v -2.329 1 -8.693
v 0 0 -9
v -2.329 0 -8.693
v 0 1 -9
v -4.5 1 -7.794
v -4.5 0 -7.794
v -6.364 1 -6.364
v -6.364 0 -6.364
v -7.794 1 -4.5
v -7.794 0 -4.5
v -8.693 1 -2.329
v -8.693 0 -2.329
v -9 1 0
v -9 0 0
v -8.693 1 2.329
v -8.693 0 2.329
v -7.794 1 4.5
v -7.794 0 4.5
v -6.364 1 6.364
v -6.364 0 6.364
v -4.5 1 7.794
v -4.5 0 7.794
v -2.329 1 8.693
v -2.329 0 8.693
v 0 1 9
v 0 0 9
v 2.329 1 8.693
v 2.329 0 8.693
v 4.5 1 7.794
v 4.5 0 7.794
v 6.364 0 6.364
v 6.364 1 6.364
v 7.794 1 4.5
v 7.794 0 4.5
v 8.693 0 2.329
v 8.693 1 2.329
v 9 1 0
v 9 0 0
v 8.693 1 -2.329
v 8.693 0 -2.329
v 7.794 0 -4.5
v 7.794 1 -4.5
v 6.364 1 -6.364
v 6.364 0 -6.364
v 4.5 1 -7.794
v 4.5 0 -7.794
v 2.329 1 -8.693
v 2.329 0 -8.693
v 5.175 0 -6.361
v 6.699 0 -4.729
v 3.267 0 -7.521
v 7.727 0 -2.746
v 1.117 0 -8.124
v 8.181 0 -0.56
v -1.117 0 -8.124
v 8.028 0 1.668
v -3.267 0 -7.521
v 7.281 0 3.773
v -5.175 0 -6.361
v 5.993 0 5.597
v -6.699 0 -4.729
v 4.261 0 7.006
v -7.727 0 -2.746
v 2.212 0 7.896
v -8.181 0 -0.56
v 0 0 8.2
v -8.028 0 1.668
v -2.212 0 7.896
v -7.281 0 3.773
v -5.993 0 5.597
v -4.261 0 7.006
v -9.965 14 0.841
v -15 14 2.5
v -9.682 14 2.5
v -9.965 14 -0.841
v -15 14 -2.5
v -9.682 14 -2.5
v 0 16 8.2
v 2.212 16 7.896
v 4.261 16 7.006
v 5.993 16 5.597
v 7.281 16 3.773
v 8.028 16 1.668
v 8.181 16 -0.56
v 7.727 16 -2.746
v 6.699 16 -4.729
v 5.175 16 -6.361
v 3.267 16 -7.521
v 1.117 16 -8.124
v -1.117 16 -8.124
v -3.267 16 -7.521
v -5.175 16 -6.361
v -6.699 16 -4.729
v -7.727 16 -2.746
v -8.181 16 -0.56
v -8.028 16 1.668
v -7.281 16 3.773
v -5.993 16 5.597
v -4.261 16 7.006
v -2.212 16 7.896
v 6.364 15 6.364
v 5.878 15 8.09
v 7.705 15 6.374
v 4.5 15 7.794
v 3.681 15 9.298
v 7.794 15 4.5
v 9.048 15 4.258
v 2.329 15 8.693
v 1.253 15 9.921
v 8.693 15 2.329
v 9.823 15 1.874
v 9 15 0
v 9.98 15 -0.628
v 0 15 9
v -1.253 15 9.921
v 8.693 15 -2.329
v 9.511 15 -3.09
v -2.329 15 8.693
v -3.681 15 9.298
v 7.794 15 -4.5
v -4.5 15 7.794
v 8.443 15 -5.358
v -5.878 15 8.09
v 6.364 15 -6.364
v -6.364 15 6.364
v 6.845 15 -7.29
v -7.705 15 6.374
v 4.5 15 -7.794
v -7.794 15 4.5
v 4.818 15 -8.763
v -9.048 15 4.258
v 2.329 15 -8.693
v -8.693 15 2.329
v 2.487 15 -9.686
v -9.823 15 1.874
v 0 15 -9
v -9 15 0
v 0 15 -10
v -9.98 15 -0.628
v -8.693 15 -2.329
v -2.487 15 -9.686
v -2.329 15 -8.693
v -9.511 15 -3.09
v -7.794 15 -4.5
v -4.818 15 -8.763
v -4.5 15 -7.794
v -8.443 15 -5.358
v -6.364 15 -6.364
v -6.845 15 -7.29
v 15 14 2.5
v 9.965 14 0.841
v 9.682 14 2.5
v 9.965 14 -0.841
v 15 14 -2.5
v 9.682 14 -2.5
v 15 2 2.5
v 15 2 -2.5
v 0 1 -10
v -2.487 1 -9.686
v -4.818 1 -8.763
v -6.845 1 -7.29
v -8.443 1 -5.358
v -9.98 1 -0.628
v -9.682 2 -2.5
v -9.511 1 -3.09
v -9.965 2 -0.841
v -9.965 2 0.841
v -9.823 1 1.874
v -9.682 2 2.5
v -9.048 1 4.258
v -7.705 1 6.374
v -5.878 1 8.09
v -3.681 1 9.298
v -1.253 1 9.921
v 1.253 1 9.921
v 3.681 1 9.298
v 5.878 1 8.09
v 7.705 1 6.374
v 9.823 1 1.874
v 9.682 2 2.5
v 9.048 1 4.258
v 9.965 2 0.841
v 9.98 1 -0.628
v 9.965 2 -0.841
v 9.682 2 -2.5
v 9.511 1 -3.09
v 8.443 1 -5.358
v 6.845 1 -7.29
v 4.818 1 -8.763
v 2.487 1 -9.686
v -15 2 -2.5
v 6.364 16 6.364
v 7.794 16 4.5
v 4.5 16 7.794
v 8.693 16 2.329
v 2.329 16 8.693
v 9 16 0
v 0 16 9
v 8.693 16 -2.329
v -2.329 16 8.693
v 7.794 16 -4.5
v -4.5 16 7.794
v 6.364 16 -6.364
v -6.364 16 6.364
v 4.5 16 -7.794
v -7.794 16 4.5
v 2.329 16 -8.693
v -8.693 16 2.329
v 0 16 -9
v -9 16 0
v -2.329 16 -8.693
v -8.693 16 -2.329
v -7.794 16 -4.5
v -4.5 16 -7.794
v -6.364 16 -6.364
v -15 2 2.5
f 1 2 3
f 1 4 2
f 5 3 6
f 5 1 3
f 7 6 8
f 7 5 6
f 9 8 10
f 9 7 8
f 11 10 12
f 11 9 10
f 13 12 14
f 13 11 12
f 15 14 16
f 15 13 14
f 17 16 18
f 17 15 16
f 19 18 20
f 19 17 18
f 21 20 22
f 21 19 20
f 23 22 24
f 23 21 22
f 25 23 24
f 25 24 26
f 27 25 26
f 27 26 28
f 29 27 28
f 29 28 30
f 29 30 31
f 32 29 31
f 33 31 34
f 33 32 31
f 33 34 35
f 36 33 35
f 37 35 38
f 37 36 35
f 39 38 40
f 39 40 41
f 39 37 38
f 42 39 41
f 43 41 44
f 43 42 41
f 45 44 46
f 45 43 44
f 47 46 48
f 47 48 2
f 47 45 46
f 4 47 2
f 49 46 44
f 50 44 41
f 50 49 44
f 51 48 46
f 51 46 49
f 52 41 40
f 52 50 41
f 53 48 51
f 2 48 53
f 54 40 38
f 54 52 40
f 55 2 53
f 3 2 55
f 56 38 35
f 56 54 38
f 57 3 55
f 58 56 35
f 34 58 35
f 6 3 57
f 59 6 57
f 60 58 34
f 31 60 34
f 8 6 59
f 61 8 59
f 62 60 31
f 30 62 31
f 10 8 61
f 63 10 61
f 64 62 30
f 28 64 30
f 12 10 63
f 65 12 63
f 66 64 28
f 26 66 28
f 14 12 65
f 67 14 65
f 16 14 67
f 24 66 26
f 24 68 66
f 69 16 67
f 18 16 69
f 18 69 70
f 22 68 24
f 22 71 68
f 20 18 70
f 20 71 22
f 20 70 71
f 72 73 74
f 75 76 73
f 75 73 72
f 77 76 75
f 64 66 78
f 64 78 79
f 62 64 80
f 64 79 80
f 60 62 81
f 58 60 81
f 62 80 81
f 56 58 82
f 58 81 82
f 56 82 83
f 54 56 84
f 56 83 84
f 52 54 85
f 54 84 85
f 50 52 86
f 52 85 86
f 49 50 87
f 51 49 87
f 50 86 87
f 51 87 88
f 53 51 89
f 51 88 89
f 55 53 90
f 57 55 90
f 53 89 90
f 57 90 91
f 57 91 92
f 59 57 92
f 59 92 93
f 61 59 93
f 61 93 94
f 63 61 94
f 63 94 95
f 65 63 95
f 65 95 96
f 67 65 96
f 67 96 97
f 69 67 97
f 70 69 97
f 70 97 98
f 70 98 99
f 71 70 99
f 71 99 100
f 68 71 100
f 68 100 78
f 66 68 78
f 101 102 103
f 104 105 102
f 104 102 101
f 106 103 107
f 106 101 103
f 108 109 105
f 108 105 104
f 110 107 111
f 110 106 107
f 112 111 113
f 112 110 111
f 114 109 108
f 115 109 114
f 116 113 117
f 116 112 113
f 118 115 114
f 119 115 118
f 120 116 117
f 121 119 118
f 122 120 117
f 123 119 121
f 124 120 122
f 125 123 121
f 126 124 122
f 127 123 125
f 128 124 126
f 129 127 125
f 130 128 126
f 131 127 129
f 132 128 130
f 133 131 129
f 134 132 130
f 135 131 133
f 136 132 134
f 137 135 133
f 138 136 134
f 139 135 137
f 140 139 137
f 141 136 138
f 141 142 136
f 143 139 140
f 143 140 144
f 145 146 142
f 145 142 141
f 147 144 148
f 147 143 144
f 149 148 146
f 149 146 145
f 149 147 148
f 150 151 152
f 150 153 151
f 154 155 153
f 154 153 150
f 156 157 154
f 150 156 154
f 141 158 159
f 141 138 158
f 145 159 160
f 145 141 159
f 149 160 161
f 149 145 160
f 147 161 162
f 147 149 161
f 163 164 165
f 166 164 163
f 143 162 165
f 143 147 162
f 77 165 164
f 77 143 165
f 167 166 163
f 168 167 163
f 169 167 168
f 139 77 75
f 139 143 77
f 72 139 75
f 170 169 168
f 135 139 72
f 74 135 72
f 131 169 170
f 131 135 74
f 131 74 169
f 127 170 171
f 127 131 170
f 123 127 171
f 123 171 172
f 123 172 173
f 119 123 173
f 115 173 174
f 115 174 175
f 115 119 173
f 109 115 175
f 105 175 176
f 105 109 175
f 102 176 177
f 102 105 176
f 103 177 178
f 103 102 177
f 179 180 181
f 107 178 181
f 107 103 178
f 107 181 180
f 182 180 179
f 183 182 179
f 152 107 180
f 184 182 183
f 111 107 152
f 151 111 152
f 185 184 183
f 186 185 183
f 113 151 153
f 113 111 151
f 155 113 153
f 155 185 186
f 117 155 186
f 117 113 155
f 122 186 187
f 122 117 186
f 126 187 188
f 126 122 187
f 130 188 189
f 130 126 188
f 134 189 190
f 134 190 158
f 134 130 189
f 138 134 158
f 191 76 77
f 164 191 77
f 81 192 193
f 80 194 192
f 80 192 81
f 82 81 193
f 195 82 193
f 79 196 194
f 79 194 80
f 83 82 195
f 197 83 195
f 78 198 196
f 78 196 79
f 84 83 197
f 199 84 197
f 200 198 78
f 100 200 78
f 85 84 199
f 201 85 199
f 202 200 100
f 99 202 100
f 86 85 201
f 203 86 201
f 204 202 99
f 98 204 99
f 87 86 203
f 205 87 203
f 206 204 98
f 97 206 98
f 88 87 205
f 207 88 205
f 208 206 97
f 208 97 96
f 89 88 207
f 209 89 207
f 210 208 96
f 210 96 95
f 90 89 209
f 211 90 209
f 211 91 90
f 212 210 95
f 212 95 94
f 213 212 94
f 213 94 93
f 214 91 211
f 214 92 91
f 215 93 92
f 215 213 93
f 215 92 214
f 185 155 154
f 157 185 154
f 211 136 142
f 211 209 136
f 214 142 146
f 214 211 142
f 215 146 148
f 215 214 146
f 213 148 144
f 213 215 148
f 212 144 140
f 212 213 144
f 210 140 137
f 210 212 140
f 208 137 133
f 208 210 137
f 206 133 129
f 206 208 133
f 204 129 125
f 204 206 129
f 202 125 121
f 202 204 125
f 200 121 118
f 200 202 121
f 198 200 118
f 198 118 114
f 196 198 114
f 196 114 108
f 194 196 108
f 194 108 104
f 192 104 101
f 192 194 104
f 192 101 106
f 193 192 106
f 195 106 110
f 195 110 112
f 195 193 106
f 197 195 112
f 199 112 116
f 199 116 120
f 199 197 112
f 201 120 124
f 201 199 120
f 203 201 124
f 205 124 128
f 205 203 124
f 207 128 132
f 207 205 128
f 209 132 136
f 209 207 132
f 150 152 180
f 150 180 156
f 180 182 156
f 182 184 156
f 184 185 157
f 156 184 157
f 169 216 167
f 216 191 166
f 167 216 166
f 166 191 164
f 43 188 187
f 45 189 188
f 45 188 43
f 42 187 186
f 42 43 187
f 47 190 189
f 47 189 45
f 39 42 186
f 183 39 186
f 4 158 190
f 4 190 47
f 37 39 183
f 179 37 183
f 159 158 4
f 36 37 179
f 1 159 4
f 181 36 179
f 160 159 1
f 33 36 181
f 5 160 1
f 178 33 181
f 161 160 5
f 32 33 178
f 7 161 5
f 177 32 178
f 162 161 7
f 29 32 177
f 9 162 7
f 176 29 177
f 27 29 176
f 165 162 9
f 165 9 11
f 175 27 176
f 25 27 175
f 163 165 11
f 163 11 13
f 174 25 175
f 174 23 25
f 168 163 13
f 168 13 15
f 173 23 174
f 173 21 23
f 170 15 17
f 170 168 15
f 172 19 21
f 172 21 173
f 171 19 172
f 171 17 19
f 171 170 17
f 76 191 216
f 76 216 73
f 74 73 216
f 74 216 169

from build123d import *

# Parameters (mm, degrees)
SKETCH_3_W              = 7
SKETCH_3_H              = 12
CONTINUOUS_TONGUE_DEPTH = 5
SKETCH_4_W              = 7
SKETCH_4_H              = 12
EXTRUDE_2_DEPTH         = 5
SKETCH_5_R              = 8.2
D16_CLEARANCE_DEPTH     = 25.103941586


with BuildPart() as part:
    # 草图1 → Round_nut (revolve)
    with BuildSketch(Plane.XY, mode=Mode.PRIVATE) as round_nut_sk:
        Polygon((4.2, 0), (9, 0), (9, 1), (10, 1), (10, 15), (9, 15), (9, 16), (4.2, 16), align=None)
    revolve(round_nut_sk.sketch.rotate(Axis((0, 0, 0), (0, 1, 0)), 90), axis=Axis((0, 0, 0), (0, 1, 0)))

    # 草图3 → Continuous_tongue (add)
    with BuildSketch(Plane.XY.offset(-2.5)):
        with Locations((-11.5, 8)):
            Rectangle(SKETCH_3_W, SKETCH_3_H)
    extrude(amount=CONTINUOUS_TONGUE_DEPTH)

    # 草图4 → 凸台-拉伸2 (add)
    with BuildSketch(Plane.XY.offset(-2.5)):
        with Locations((11.5, 8)):
            Rectangle(SKETCH_4_W, SKETCH_4_H)
    extrude(amount=EXTRUDE_2_DEPTH)

    # 草图5 → D16_clearance (cut, through all)
    with BuildSketch(Plane(origin=(0, 16, 0), x_dir=(1, 0, 0), z_dir=(0, 1, 0))):
        with Locations(Location((0, 0, 0), (0, 0, 270))):
            Circle(SKETCH_5_R)
    extrude(amount=-D16_CLEARANCE_DEPTH, mode=Mode.SUBTRACT)


solid = part.part
